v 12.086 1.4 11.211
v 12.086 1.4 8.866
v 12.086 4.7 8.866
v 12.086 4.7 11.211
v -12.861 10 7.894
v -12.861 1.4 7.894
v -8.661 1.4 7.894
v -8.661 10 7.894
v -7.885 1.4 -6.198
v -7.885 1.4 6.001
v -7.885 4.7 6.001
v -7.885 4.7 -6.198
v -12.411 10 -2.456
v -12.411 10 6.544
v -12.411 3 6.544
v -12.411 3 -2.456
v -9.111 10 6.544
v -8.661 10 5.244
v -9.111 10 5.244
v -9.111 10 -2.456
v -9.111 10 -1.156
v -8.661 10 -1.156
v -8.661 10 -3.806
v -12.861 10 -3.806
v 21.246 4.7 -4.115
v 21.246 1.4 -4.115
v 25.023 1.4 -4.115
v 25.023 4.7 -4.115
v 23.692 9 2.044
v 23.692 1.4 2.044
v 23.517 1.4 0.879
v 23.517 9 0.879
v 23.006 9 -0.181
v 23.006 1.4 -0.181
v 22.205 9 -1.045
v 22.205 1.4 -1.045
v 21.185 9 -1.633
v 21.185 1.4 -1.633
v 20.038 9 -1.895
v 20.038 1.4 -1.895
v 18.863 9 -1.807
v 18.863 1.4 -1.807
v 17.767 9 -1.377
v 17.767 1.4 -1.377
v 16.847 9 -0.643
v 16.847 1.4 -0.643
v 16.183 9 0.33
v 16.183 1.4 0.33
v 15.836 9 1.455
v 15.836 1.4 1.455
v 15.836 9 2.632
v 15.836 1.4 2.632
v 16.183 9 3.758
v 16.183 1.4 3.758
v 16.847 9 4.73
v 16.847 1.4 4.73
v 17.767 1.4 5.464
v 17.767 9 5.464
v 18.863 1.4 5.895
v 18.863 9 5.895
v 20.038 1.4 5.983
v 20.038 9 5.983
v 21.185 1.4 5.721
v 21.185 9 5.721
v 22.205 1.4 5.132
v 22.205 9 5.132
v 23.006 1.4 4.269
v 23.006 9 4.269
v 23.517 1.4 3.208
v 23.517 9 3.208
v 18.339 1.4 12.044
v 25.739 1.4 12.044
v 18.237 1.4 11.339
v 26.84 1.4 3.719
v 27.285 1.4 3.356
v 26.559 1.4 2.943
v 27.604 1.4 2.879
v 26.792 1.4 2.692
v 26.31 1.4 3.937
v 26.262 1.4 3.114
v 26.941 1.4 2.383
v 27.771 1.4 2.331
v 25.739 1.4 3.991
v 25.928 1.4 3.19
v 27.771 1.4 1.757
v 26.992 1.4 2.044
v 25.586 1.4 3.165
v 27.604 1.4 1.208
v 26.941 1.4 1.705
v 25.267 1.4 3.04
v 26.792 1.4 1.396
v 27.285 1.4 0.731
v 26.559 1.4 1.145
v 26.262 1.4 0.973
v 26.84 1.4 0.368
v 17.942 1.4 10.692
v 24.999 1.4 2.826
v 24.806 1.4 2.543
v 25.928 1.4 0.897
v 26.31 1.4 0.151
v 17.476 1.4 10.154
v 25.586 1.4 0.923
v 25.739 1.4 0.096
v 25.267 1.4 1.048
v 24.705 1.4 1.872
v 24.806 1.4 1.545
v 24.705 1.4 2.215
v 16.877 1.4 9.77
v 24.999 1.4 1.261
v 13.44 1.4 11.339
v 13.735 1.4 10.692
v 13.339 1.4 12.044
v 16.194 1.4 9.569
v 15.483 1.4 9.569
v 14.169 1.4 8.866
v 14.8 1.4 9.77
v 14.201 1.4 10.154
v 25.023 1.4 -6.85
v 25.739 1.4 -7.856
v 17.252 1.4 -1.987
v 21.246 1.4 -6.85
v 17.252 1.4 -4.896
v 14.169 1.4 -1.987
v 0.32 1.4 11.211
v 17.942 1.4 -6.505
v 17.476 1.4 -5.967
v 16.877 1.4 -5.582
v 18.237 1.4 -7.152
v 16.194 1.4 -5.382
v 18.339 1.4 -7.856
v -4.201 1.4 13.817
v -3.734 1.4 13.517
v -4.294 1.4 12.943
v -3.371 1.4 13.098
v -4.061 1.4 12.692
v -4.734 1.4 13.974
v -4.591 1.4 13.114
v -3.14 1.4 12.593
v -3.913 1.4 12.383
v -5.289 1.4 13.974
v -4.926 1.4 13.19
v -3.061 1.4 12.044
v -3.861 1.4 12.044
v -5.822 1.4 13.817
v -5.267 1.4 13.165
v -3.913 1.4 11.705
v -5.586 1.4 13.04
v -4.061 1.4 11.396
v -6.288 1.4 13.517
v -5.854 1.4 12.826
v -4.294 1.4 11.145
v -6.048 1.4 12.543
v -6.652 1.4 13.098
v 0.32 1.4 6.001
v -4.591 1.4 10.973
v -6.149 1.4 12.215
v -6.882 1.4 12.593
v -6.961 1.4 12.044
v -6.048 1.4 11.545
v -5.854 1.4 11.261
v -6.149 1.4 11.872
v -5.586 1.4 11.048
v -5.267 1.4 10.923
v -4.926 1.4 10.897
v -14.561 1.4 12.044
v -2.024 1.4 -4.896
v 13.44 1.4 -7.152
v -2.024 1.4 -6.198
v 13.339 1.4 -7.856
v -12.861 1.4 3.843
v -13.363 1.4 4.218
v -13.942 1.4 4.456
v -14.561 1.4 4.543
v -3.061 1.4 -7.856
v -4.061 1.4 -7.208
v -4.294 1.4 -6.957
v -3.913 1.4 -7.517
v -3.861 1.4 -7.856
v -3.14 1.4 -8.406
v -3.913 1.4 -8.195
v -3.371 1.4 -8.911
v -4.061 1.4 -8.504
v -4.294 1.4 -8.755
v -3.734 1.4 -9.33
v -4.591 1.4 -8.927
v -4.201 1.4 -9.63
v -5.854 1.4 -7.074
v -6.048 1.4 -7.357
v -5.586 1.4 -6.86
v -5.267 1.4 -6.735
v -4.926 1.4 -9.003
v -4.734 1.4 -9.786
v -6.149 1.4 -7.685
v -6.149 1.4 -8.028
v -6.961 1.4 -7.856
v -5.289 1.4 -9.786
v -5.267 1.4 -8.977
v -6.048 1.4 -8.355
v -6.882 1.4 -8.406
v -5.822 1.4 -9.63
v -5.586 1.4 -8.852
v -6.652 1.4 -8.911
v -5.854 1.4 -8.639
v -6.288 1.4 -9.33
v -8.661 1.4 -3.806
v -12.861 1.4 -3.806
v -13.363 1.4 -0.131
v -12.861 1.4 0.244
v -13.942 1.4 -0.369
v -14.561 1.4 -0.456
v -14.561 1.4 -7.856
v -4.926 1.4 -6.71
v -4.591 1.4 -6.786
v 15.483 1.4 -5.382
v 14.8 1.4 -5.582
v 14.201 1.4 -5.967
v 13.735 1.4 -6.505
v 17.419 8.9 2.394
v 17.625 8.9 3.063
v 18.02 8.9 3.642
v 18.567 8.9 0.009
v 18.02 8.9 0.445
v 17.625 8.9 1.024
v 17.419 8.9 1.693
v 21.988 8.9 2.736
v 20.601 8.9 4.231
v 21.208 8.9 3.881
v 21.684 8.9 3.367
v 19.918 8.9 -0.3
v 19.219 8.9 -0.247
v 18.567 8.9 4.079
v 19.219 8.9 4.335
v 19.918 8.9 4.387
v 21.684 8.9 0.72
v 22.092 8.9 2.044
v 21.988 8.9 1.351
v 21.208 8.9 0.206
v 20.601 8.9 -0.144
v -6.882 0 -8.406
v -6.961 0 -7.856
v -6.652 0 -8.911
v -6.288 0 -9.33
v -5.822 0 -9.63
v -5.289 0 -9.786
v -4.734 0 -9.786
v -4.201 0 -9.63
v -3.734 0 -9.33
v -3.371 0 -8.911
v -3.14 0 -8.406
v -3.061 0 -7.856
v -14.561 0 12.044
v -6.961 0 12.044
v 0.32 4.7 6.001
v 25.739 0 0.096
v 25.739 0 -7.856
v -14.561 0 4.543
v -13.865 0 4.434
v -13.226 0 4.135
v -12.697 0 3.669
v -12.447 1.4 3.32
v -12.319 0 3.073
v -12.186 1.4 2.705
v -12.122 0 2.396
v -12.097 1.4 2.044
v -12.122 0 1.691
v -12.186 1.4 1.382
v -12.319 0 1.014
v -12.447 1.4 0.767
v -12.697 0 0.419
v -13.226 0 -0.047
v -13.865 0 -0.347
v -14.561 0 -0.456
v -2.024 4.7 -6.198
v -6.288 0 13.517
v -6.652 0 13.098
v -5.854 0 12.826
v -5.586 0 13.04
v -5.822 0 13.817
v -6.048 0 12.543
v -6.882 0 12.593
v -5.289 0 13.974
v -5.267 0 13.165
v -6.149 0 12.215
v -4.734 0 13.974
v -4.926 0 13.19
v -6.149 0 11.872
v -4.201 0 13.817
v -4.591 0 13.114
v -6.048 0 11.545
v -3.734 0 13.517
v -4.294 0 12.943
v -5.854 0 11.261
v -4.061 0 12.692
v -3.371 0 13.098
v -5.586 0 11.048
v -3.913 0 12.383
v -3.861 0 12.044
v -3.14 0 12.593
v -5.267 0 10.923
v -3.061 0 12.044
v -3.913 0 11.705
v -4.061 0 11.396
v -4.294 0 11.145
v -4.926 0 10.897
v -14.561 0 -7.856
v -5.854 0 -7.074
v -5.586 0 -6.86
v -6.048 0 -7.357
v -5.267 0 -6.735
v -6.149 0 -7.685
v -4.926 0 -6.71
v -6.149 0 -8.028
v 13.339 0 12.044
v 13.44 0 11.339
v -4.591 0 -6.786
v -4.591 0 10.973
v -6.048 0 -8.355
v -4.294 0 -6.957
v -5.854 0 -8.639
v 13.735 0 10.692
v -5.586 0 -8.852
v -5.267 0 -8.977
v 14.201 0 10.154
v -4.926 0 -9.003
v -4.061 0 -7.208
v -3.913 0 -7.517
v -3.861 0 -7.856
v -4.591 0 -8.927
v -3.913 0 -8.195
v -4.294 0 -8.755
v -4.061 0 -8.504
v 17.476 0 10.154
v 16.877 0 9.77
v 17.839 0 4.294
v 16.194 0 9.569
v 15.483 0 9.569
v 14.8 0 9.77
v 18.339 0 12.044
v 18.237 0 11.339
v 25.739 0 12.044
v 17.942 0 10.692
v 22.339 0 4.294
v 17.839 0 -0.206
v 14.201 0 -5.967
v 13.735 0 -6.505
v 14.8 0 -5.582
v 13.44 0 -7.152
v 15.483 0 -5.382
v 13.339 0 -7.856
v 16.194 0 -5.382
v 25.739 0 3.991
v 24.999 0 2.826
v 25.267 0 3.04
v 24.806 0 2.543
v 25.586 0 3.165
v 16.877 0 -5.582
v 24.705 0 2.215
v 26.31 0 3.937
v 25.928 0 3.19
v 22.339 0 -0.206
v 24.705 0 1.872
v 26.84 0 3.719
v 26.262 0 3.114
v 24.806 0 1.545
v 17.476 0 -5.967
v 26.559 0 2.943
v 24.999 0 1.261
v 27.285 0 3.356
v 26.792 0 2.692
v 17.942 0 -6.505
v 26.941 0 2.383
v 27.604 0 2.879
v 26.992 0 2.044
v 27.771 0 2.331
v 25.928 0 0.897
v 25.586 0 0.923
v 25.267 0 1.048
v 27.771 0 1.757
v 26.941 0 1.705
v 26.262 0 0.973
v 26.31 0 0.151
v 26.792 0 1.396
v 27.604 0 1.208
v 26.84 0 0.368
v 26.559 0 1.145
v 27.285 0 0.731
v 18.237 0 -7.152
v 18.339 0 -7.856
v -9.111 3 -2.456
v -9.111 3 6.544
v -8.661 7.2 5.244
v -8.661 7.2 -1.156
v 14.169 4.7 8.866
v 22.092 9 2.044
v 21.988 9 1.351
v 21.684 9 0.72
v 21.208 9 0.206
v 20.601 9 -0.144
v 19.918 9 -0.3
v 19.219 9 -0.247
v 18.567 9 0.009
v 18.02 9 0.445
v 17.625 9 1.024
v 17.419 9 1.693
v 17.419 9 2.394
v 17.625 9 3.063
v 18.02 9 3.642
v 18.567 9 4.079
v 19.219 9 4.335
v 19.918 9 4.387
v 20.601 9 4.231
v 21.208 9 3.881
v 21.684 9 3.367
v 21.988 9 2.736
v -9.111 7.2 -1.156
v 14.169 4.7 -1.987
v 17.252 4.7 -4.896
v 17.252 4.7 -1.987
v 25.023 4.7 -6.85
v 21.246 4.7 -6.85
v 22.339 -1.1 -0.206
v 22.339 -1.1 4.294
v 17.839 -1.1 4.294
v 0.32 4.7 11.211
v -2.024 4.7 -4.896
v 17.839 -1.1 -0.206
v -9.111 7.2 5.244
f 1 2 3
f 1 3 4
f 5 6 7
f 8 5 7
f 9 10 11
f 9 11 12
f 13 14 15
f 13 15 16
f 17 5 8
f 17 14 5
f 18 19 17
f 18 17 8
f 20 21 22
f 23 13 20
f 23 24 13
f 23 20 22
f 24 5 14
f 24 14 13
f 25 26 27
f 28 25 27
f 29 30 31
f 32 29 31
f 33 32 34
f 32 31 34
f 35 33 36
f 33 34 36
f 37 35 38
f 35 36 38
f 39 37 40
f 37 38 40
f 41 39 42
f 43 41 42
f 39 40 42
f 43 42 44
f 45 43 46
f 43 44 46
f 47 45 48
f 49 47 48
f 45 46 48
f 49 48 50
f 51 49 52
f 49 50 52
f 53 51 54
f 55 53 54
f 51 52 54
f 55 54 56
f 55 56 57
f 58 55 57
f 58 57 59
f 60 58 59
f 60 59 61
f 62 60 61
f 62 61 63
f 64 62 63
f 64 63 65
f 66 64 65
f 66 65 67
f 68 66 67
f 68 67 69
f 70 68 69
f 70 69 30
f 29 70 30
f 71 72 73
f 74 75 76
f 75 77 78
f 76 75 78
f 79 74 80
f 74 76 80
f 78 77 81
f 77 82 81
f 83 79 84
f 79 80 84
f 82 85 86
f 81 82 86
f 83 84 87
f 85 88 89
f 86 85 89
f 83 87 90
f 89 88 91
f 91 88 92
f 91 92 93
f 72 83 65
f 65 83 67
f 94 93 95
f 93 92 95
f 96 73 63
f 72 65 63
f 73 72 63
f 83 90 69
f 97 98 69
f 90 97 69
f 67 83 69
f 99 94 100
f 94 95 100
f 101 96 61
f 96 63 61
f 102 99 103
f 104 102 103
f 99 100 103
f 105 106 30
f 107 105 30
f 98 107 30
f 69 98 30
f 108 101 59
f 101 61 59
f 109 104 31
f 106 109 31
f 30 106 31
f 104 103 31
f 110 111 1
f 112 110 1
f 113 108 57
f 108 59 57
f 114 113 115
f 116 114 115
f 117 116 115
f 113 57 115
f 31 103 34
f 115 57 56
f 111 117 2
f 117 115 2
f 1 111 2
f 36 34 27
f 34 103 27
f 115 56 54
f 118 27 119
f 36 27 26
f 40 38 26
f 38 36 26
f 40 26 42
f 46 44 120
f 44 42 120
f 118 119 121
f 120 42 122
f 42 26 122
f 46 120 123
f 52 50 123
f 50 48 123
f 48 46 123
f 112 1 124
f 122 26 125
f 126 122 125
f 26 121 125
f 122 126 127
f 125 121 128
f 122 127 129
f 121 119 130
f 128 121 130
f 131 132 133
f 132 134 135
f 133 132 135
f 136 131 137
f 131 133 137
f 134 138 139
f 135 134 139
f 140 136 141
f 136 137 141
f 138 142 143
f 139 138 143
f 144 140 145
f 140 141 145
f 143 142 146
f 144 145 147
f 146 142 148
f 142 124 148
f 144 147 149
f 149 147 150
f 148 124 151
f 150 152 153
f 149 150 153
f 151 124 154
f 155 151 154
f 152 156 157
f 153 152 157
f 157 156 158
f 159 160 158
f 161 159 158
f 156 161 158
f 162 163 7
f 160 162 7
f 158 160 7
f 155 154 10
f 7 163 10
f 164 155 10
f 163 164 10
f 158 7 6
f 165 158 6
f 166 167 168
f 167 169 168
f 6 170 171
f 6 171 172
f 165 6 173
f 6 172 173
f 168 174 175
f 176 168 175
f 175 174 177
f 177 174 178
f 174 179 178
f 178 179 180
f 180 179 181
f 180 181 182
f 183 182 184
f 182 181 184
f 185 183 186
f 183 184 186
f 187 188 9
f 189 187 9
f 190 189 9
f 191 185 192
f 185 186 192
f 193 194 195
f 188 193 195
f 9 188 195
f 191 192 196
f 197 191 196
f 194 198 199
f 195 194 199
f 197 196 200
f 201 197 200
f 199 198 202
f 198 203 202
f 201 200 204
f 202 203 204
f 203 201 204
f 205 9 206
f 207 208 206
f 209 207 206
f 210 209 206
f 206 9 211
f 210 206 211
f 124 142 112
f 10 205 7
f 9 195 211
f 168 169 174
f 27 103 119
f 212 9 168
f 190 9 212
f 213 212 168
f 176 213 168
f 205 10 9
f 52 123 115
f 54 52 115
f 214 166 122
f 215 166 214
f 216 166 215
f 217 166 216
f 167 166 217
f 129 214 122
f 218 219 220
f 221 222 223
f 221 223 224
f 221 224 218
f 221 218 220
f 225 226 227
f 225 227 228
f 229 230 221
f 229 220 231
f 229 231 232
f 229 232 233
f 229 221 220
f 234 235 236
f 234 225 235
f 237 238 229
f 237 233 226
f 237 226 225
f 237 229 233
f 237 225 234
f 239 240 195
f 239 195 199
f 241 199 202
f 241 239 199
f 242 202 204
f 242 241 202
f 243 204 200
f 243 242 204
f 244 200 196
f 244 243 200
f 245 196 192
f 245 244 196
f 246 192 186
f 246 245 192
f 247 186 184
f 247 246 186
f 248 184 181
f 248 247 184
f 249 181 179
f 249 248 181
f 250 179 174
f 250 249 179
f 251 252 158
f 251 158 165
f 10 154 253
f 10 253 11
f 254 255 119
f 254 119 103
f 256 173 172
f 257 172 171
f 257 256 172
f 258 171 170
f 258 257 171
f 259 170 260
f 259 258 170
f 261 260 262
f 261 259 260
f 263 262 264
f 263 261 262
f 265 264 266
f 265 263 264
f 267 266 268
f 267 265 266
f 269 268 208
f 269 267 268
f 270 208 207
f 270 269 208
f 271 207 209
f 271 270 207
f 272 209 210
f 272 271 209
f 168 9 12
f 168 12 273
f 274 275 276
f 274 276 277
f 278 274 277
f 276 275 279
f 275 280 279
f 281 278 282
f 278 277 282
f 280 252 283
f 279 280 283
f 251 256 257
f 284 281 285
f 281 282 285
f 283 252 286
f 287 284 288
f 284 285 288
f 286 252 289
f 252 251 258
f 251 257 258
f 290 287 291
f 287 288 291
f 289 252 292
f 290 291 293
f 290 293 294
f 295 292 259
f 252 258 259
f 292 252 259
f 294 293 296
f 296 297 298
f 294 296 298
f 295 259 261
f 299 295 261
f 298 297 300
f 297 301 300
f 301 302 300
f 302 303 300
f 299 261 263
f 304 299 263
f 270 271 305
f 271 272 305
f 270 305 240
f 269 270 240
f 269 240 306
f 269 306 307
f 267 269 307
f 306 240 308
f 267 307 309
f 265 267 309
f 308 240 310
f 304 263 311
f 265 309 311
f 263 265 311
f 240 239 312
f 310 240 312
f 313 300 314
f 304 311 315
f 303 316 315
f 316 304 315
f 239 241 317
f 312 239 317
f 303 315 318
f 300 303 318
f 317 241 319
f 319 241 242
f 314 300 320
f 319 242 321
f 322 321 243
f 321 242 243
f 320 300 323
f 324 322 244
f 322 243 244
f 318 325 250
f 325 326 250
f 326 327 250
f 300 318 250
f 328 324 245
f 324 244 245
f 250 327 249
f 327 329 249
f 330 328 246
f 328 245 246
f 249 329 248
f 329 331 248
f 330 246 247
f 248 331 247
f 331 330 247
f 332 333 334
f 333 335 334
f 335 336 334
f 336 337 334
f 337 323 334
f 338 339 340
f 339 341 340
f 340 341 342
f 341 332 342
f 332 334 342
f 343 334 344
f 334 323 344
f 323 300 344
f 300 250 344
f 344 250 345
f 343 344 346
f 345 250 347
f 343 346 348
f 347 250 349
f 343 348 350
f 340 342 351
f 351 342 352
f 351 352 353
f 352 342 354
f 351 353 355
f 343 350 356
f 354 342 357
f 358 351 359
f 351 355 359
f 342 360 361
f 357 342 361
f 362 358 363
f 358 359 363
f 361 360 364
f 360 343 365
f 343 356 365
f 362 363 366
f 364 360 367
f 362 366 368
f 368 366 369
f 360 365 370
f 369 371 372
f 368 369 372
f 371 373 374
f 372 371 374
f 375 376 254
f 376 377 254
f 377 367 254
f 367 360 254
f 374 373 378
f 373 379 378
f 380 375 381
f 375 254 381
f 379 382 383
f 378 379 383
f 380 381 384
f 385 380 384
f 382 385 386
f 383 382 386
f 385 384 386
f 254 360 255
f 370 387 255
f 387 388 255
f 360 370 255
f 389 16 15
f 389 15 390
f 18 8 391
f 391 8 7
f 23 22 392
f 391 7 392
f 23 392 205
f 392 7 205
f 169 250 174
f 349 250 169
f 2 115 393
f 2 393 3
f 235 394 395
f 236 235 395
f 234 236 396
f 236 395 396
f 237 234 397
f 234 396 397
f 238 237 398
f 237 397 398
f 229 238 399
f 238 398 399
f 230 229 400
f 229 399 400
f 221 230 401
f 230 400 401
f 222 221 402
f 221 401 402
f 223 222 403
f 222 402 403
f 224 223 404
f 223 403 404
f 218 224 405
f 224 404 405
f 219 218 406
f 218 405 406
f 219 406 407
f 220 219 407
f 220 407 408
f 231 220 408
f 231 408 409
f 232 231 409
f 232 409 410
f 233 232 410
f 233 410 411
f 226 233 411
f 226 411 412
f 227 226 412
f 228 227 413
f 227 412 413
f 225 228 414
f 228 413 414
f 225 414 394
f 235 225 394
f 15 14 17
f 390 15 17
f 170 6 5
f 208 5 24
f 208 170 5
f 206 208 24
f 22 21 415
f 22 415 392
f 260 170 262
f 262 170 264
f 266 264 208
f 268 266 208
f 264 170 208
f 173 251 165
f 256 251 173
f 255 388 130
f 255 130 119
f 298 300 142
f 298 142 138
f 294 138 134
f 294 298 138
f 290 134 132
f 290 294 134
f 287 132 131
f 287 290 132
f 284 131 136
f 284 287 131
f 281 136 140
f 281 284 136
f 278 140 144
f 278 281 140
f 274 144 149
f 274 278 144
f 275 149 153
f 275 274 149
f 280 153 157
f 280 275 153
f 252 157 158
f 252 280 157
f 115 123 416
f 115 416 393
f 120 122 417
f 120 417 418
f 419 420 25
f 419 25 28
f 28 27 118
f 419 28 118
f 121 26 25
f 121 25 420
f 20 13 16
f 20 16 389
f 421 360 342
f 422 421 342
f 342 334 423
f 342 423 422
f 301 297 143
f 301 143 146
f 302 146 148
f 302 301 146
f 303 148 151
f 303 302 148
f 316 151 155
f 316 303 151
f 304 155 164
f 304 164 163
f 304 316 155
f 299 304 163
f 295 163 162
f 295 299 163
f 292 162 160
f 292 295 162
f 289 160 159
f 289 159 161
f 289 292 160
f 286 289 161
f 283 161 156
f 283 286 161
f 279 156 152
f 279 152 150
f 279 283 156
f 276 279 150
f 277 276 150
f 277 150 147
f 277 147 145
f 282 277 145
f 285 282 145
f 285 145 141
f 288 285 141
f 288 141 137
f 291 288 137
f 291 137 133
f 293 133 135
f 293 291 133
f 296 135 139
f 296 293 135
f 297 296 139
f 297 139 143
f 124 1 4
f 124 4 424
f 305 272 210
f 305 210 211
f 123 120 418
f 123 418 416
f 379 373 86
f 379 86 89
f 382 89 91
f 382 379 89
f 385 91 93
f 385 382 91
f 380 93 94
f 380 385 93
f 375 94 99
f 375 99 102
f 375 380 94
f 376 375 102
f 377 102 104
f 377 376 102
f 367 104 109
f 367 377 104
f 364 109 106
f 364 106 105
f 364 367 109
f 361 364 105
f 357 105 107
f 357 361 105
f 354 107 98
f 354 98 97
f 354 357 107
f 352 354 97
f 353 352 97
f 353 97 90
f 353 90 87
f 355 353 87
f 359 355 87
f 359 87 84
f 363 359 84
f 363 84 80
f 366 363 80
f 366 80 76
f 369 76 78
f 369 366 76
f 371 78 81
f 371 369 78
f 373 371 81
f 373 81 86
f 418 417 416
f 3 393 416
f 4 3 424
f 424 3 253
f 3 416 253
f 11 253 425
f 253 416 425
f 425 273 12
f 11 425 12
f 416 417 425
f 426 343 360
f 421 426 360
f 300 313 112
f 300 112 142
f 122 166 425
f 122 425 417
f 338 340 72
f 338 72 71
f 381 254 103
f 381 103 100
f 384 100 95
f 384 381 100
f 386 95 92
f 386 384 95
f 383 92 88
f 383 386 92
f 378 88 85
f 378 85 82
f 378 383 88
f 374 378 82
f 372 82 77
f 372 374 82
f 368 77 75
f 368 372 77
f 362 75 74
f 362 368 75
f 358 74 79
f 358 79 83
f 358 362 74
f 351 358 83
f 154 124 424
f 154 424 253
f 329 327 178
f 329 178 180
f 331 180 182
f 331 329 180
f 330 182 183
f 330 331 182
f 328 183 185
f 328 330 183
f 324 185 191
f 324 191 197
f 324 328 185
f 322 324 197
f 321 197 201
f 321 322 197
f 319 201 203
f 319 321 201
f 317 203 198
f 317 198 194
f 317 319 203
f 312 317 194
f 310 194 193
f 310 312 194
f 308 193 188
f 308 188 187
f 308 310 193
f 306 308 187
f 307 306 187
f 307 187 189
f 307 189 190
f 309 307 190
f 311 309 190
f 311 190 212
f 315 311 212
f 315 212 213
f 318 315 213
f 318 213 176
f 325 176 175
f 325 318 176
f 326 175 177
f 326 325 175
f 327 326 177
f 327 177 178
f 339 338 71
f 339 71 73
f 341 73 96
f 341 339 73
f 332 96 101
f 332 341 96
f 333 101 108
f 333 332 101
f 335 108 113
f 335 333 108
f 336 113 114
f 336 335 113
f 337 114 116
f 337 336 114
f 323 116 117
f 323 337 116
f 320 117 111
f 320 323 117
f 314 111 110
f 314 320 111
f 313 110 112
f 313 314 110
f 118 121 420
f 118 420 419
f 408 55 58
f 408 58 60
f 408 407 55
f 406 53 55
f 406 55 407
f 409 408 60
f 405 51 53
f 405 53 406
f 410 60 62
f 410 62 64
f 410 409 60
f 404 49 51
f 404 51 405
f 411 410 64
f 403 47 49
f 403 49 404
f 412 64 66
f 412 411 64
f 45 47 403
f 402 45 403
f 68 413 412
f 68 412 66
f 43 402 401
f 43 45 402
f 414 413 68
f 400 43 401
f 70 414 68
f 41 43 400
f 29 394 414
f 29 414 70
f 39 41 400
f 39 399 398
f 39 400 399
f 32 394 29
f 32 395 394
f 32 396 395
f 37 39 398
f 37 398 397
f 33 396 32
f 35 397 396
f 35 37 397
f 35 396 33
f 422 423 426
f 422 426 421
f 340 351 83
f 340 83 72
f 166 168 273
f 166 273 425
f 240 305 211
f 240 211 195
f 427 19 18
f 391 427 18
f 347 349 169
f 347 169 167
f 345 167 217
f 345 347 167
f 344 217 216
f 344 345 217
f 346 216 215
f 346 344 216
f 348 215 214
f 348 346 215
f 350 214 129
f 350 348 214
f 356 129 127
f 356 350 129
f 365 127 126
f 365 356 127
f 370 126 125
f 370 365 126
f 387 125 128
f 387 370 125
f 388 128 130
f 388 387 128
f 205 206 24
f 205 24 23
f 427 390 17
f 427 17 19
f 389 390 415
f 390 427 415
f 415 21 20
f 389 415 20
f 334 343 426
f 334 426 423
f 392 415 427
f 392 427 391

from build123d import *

# Parameters (mm, degrees)
SKETCH1_R           = 1.15
BOSS_EXTRUDE1_DEPTH = 1.4
BOSS_EXTRUDE2_START = -1.4
SKETCH2_R           = 3.95
BOSS_EXTRUDE2_DEPTH = 9
SKETCH3_W           = 4.2
SKETCH3_H           = 11.7
BOSS_EXTRUDE4_DEPTH = 8.6
SKETCH4_W           = 3.3
SKETCH4_H           = 9
CUT_EXTRUDE1_DEPTH  = 7
SKETCH5_W           = 0.45
SKETCH5_H           = 6.4
CUT_EXTRUDE2_DEPTH  = 2.8
SKETCH6_W           = 3.777009852
SKETCH6_H           = 2.7350761
BOSS_EXTRUDE6_DEPTH = 3.3
SKETCH7_W           = 4.5
SKETCH7_H           = 4.5
BOSS_EXTRUDE7_DEPTH = 1.1
SKETCH8_R           = 2.35
CUT_EXTRUDE3_DEPTH  = 0.1


with BuildPart() as part:
    # Sketch1 → Boss-Extrude1 (new body)
    with BuildSketch(Plane(origin=(0, 0, 0), x_dir=(1, 0, 0), z_dir=(0, 1, 0))):
        with BuildLine():
            Line((25.738550612, -3.990919322), (25.738550612, -12.04368231))
            Line((25.738550612, -12.04368231), (18.338550612, -12.04368231))
            ThreePointArc((18.338550612, -12.04368231), (15.838550612, -9.54368231), (13.338550612, -12.04368231))
            Line((13.338550612, -12.04368231), (-3.061449388, -12.04368231))
            ThreePointArc((-3.061449388, -12.04368231), (-5.011449388, -13.99368231), (-6.961449388, -12.04368231))
            Line((-6.961449388, -12.04368231), (-14.561449388, -12.04368231))
            Line((-14.561449388, -12.04368231), (-14.561449388, -4.543434765))
            ThreePointArc((-14.561449388, -4.543434765), (-12.096629884, -2.04368231), (-14.561449388, 0.456070144))
            Line((-14.561449388, 0.456070144), (-14.561449388, 7.85631769))
            Line((-14.561449388, 7.85631769), (-6.961449388, 7.85631769))
            ThreePointArc((-6.961449388, 7.85631769), (-5.011449388, 9.80631769), (-3.061449388, 7.85631769))
            Line((-3.061449388, 7.85631769), (13.338550612, 7.85631769))
            ThreePointArc((13.338550612, 7.85631769), (15.838550612, 5.35631769), (18.338550612, 7.85631769))
            Line((18.338550612, 7.85631769), (25.738550612, 7.85631769))
            Line((25.738550612, 7.85631769), (25.738550612, -0.096445299))
            ThreePointArc((25.738550612, -0.096445299), (27.792319693, -2.04368231), (25.738550612, -3.990919322))
        make_face()
        with Locations((25.842319693, -2.04368231)):
            Circle(SKETCH1_R, mode=Mode.SUBTRACT)
        with Locations((-5.011449388, -12.04368231)):
            Circle(SKETCH1_R, mode=Mode.SUBTRACT)
        with Locations((-5.011449388, 7.85631769)):
            Circle(SKETCH1_R, mode=Mode.SUBTRACT)
    extrude(amount=BOSS_EXTRUDE1_DEPTH)

    # Sketch2 → Boss-Extrude2 (add)
    with BuildSketch(Plane(origin=(0, 1.4, 0), x_dir=(1, 0, 0), z_dir=(0, 1, 0)).offset(BOSS_EXTRUDE2_START)):
        with Locations((19.742319693, -2.04368231)):
            Circle(SKETCH2_R)
    extrude(amount=BOSS_EXTRUDE2_DEPTH)

    # Sketch3 → Boss-Extrude4 (add)
    with BuildSketch(Plane(origin=(0, 1.4, 0), x_dir=(1, 0, 0), z_dir=(0, 1, 0))):
        with Locations((-10.761449388, -2.04368231)):
            Rectangle(SKETCH3_W, SKETCH3_H)
    extrude(amount=BOSS_EXTRUDE4_DEPTH)

    # Sketch4 → Cut-Extrude1 (cut)
    with BuildSketch(Plane(origin=(0, 10, 0), x_dir=(1, 0, 0), z_dir=(0, 1, 0))):
        with Locations((-10.761449388, -2.04368231)):
            Rectangle(SKETCH4_W, SKETCH4_H)
    extrude(amount=-CUT_EXTRUDE1_DEPTH, mode=Mode.SUBTRACT)

    # Sketch5 → Cut-Extrude2 (cut)
    with BuildSketch(Plane(origin=(0, 10, 0), x_dir=(1, 0, 0), z_dir=(0, 1, 0))):
        with Locations((-8.886449388, -2.04368231)):
            Rectangle(SKETCH5_W, SKETCH5_H)
    extrude(amount=-CUT_EXTRUDE2_DEPTH, mode=Mode.SUBTRACT)

    # Sketch6 → Boss-Extrude6 (add)
    with BuildSketch(Plane(origin=(0, 1.4, 0), x_dir=(1, 0, 0), z_dir=(0, 1, 0))):
        Polygon((-7.884809568, 6.198373802), (-2.023932211, 6.198373802), (-2.023932211, 4.895956612), (17.251842208, 4.895956612), (17.251842208, 1.987224886), (14.169454857, 1.987224886), (14.169454857, -8.866251701), (12.085587353, -8.866251701), (12.085587353, -11.210602644), (0.320418732, -11.210602644), (0.320418732, -6.000933882), (-7.884809568, -6.000933882), align=None)
        with Locations((23.134426518, 5.482044347)):
            Rectangle(SKETCH6_W, SKETCH6_H)
    extrude(amount=BOSS_EXTRUDE6_DEPTH)

    # Sketch7 → Boss-Extrude7 (add)
    with BuildSketch(Plane.XZ):
        with Locations((20.088550612, 2.04368231)):
            Rectangle(SKETCH7_W, SKETCH7_H)
    extrude(amount=BOSS_EXTRUDE7_DEPTH)

    # Sketch8 → Cut-Extrude3 (cut)
    with BuildSketch(Plane(origin=(0, 9, 0), x_dir=(1, 0, 0), z_dir=(0, 1, 0))):
        with Locations((19.742319693, -2.04368231)):
            Circle(SKETCH8_R)
    extrude(amount=-CUT_EXTRUDE3_DEPTH, mode=Mode.SUBTRACT)


solid = part.part
